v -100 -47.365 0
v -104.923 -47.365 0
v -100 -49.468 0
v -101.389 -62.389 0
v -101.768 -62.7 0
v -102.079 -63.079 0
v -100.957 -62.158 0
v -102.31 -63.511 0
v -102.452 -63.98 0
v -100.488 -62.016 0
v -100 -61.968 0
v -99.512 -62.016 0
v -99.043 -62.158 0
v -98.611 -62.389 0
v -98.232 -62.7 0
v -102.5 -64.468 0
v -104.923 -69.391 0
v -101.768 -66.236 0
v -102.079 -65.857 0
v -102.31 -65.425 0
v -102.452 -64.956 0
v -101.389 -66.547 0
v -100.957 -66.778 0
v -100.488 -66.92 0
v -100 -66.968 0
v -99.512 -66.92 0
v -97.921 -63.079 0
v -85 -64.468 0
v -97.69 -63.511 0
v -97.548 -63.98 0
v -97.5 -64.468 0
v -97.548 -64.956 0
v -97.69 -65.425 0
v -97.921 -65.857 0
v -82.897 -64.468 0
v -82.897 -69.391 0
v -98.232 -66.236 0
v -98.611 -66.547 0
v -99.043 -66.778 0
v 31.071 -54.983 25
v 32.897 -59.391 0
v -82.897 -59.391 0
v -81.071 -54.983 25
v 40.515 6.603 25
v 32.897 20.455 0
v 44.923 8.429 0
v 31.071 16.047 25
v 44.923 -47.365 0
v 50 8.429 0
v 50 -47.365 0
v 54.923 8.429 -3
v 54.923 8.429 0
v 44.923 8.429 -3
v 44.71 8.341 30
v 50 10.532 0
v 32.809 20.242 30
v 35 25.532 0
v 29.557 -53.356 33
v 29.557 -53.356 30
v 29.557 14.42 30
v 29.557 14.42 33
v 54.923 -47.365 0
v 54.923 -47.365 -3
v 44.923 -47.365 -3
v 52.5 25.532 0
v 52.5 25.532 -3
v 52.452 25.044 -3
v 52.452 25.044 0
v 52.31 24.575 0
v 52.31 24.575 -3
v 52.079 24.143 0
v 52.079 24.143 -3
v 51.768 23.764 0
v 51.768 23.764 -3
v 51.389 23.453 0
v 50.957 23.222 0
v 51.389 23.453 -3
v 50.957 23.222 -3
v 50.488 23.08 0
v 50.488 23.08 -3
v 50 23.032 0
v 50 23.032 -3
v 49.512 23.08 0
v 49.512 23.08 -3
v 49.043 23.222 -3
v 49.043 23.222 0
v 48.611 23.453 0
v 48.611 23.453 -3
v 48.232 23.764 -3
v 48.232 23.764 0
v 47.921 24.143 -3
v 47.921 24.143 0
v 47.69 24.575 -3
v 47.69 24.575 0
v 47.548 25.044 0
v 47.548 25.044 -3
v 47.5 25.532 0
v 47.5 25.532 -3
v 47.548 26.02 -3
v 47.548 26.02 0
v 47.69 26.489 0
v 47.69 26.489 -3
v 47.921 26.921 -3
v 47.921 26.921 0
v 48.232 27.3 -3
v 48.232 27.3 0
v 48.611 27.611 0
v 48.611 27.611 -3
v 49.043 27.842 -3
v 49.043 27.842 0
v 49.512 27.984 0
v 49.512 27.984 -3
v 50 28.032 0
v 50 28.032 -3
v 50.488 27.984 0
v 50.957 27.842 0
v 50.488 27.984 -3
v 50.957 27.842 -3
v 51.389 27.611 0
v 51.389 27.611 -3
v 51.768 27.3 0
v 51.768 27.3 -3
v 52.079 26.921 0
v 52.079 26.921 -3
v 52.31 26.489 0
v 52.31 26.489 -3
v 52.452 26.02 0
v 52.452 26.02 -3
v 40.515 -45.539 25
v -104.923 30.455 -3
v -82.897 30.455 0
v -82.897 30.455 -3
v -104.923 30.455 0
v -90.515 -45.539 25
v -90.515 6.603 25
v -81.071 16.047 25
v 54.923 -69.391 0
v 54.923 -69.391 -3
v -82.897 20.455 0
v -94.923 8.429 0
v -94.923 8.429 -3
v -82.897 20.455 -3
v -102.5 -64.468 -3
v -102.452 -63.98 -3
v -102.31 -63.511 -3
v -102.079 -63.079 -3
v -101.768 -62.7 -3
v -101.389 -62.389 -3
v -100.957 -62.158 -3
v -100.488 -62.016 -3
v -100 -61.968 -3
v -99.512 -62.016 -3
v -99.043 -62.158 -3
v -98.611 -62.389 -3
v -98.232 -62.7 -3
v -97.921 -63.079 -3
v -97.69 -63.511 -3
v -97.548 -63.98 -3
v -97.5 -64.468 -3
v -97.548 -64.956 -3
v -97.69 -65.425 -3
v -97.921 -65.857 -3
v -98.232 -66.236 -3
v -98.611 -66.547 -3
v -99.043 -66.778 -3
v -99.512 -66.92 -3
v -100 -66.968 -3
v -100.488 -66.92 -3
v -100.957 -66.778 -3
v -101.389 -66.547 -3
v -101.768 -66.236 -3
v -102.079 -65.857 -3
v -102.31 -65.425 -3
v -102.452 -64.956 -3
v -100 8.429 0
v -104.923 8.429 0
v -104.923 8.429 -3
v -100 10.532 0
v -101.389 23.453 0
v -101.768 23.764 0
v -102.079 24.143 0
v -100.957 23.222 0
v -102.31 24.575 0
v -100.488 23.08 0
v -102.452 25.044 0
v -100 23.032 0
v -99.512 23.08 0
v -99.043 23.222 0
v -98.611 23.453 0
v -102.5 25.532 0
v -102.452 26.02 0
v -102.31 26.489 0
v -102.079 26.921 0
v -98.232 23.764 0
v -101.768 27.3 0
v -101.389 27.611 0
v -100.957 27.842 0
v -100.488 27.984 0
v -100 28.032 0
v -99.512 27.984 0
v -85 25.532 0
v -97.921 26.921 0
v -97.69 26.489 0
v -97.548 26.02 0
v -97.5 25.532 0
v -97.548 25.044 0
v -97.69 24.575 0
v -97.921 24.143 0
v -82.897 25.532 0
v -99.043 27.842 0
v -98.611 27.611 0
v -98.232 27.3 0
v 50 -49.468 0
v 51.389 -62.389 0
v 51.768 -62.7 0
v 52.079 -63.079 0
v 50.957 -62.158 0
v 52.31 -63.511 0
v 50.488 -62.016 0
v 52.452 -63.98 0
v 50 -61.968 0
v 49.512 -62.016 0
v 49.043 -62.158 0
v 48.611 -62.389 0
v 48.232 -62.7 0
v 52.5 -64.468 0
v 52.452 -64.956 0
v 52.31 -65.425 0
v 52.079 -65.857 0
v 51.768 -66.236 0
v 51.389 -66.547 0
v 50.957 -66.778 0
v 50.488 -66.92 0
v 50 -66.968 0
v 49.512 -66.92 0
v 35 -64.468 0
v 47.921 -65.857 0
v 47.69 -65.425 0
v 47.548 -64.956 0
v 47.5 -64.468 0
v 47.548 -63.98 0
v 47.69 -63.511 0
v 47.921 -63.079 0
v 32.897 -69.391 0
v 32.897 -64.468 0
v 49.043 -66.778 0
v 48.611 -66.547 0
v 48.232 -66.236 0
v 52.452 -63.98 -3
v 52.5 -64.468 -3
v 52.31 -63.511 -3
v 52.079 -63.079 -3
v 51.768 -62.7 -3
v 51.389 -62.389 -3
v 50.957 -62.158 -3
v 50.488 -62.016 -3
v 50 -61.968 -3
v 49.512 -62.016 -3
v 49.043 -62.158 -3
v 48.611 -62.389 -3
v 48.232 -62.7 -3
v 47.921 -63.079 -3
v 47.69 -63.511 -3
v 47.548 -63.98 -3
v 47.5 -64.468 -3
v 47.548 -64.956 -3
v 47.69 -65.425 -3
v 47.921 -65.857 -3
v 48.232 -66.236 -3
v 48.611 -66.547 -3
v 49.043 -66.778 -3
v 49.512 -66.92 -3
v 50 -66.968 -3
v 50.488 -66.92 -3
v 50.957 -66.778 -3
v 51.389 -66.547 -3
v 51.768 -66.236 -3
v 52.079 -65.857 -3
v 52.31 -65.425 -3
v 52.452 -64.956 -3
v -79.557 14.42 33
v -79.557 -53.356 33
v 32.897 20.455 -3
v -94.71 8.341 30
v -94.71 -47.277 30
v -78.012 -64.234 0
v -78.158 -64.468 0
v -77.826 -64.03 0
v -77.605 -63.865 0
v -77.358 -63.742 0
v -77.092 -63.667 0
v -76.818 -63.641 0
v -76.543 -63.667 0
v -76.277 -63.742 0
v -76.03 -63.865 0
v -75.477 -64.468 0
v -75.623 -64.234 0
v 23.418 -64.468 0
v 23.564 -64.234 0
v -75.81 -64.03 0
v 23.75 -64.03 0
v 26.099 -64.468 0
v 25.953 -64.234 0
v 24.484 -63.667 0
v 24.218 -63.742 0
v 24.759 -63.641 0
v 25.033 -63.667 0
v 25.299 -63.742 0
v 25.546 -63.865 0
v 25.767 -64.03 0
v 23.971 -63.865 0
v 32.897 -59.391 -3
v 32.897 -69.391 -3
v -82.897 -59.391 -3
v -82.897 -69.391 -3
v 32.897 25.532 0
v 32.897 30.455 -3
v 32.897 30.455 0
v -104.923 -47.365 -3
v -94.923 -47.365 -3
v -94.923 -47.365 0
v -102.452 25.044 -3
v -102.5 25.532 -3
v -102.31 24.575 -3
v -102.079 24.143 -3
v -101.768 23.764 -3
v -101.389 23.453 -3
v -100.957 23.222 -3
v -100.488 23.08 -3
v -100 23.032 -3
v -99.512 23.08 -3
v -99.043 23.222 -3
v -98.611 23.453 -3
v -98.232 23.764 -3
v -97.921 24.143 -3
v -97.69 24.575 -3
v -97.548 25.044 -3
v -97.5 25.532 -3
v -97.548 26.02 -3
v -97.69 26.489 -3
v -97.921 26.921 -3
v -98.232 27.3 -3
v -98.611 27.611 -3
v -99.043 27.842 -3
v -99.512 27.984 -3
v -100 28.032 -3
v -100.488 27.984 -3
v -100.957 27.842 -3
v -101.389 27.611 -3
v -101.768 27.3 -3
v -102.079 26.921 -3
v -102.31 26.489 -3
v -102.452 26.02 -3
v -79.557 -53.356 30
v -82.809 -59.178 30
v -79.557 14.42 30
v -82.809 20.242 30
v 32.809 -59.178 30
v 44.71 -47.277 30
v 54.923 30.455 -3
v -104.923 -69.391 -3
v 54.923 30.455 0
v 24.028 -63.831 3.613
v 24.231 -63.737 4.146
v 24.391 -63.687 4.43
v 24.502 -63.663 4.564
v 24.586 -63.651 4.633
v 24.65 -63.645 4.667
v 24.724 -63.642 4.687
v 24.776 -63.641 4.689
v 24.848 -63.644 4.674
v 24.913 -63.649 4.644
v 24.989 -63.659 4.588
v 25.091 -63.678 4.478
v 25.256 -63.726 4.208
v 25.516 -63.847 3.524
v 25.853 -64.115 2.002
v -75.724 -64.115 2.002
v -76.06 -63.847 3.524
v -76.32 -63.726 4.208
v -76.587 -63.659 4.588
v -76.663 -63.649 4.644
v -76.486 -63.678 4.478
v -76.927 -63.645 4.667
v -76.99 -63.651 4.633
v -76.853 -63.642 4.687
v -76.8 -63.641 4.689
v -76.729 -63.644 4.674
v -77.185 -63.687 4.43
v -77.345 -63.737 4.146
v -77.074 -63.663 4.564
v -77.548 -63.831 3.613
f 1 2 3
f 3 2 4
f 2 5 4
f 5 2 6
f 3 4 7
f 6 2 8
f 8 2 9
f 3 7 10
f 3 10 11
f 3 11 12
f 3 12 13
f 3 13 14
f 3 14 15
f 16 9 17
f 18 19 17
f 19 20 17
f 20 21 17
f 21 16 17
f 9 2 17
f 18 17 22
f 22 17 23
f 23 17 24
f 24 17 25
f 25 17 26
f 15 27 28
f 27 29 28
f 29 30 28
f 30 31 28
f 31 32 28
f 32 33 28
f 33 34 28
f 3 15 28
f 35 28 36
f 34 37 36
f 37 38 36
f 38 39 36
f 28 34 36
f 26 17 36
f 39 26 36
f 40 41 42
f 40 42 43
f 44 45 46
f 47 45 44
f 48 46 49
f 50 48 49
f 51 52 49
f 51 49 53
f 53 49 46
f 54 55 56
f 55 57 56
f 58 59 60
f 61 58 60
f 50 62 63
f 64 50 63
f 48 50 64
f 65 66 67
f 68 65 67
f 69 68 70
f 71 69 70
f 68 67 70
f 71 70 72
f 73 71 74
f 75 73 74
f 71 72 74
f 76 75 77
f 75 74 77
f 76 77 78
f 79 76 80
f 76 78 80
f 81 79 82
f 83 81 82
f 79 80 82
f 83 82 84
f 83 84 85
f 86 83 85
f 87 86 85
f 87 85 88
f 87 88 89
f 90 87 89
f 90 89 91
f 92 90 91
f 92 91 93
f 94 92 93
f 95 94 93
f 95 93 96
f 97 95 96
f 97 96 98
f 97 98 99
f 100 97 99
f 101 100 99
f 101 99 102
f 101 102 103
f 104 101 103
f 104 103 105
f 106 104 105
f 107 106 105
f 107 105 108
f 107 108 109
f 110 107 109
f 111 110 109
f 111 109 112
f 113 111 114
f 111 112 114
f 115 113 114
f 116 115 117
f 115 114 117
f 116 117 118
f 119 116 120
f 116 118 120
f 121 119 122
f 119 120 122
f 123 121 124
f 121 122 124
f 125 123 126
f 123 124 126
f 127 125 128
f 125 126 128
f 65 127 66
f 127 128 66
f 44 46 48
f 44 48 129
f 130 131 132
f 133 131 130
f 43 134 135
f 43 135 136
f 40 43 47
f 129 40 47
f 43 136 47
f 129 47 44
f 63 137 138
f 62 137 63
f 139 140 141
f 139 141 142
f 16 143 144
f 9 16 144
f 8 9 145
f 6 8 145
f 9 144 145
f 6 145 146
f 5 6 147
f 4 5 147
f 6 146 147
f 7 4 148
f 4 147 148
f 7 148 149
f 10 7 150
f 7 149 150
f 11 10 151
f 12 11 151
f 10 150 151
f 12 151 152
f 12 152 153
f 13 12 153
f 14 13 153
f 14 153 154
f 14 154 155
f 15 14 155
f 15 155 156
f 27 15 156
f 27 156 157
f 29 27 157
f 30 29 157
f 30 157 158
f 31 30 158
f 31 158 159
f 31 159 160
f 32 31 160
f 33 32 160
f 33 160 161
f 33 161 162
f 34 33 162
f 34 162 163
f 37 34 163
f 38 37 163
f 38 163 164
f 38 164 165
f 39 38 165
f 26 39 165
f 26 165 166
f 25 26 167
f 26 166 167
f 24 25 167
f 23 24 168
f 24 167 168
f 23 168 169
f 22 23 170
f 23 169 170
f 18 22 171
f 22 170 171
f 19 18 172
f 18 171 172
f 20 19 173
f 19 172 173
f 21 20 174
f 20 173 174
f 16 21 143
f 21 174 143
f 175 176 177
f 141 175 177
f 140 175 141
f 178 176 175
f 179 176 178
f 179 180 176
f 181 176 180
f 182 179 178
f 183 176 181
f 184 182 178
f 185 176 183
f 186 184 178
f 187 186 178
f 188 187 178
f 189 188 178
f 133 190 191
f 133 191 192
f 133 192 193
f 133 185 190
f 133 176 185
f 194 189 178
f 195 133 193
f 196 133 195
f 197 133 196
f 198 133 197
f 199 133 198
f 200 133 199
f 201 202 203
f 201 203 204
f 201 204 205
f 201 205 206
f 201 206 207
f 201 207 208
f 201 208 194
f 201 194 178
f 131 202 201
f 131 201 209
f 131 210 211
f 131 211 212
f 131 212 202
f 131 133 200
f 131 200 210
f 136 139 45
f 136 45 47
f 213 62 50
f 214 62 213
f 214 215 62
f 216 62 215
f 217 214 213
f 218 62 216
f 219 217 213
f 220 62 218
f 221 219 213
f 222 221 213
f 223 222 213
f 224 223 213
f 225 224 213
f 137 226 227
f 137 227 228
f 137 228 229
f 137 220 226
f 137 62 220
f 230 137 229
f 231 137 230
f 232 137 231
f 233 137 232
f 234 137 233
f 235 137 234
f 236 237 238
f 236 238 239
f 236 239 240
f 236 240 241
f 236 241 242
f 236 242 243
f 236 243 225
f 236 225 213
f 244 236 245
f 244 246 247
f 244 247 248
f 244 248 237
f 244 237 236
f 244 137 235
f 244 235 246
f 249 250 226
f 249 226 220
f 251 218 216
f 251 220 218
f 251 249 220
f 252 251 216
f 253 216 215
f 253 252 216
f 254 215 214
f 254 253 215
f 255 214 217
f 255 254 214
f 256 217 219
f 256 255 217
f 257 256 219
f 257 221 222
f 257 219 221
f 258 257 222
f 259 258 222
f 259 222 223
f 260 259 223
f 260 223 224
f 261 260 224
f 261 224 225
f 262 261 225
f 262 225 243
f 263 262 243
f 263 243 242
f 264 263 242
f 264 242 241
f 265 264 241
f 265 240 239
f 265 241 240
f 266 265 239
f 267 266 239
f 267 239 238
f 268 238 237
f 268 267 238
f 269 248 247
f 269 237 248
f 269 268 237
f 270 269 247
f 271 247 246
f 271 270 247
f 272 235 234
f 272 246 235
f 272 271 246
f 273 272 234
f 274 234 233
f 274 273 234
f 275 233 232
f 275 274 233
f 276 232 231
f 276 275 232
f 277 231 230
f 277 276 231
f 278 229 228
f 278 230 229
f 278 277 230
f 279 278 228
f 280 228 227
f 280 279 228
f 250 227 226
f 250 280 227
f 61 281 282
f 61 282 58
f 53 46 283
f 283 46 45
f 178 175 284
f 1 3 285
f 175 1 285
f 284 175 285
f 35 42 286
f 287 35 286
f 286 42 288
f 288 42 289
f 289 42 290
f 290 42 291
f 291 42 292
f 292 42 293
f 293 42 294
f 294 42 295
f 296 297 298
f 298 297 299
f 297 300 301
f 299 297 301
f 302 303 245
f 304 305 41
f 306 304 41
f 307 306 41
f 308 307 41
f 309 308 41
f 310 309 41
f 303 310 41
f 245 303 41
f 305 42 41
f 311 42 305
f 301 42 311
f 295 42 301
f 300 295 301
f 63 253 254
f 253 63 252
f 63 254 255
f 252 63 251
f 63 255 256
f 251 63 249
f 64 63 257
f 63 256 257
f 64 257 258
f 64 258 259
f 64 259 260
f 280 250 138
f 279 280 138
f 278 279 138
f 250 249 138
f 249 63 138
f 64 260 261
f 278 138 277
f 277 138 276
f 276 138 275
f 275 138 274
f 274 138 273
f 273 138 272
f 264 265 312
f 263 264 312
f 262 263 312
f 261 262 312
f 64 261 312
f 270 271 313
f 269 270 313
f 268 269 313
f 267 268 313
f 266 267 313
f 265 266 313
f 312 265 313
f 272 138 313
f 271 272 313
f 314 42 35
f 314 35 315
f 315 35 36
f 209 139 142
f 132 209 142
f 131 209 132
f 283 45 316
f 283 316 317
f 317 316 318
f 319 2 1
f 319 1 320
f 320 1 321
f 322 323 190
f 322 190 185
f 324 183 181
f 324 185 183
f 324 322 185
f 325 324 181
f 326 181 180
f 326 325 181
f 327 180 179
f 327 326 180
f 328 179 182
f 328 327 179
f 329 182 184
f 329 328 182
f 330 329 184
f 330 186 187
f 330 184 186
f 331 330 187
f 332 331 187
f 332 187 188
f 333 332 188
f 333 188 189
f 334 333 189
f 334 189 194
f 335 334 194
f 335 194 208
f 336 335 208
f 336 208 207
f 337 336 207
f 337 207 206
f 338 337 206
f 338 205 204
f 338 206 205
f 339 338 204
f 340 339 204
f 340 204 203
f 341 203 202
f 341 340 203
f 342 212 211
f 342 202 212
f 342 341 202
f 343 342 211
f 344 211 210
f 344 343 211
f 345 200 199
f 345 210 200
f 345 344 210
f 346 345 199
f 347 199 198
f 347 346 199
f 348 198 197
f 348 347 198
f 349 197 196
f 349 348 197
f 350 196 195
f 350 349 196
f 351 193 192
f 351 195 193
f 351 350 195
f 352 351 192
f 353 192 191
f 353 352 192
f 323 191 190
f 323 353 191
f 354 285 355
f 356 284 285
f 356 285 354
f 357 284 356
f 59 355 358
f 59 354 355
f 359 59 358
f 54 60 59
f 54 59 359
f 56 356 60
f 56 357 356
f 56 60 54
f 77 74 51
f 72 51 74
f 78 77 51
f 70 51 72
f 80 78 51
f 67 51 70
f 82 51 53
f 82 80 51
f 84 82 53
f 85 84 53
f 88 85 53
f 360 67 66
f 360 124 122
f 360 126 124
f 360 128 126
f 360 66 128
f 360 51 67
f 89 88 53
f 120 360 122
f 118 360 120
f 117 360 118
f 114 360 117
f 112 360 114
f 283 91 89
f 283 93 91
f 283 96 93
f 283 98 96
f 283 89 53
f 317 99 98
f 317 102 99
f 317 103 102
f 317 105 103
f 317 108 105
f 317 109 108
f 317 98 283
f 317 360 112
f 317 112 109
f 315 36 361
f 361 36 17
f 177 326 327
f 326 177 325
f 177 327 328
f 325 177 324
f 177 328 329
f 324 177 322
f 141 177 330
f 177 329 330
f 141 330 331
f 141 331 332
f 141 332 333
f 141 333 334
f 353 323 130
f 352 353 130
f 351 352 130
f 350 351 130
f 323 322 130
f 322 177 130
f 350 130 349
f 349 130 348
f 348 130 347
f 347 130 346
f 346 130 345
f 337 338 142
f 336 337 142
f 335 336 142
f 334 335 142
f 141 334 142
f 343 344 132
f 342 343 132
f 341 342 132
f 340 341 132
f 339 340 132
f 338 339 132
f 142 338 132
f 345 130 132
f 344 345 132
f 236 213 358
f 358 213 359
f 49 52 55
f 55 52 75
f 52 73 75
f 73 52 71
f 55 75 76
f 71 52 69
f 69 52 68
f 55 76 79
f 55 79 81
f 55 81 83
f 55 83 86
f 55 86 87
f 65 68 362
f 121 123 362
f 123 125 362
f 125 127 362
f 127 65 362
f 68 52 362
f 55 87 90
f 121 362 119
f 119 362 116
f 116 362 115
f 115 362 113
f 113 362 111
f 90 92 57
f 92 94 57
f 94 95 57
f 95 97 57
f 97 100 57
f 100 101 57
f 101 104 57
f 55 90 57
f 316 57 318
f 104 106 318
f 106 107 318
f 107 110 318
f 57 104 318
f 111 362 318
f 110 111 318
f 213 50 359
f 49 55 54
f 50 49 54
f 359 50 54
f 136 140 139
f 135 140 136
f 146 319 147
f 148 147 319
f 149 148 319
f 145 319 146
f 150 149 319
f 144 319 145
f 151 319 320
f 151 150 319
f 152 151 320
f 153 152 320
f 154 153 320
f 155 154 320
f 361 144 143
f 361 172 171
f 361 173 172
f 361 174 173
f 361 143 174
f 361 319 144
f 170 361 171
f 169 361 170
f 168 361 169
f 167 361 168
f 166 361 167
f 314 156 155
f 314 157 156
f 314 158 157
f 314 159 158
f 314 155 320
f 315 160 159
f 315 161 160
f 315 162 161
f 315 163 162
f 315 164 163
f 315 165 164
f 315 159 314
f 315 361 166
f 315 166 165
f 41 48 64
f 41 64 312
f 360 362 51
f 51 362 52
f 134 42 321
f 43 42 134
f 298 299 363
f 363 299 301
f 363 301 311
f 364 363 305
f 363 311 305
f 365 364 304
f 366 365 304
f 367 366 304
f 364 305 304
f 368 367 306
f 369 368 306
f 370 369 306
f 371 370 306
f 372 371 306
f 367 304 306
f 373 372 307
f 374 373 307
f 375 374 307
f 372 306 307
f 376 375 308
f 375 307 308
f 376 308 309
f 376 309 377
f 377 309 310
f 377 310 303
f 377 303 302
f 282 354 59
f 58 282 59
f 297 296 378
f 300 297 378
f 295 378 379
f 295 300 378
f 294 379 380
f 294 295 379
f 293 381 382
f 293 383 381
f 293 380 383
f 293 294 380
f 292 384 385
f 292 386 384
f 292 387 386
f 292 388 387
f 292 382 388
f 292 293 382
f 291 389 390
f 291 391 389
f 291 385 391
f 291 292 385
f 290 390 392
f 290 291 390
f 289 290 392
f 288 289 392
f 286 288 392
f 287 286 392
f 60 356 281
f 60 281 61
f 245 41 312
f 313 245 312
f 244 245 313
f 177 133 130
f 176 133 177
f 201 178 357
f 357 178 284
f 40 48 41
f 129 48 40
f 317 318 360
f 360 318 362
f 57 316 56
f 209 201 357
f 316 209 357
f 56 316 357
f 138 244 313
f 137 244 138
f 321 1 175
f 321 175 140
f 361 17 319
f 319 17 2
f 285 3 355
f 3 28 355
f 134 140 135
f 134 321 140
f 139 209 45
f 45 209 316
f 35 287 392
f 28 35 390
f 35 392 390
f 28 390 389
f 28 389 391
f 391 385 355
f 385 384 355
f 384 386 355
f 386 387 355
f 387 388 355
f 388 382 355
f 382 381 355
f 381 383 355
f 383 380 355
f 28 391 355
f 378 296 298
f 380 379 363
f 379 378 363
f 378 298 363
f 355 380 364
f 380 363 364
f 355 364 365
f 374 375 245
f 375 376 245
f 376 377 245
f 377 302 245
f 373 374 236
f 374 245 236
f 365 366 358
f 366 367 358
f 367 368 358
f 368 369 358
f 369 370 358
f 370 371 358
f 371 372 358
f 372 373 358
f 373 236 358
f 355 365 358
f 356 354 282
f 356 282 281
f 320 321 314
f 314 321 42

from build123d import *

# Parameters (mm, degrees)
BOSS_EXTRUDE1_DEPTH     = 30
BOSS_EXTRUDE1_TAPER     = 10
SHELL1_T                = -5
SKETCH4_R               = 1.5
CUT_EXTRUDE1_DEPTH      = 15
SKETCH5_W               = 109.114976024
SKETCH5_H               = 67.775815427
BOSS_EXTRUDE3_DEPTH     = 3
BOSS_EXTRUDE5_DEPTH     = 3
MIRROR5_COPY_1_DEPTH    = 3
CUT_EXTRUDE2_START      = -4
SKETCH9_R               = 2.5
CUT_EXTRUDE2_DEPTH      = 38
MIRROR7_START           = -4
MIRROR7_COPY_1_SKETCH_R = 2.5
MIRROR7_COPY_1_DEPTH    = 38


with BuildPart() as part:
    # Sketch1 → Boss-Extrude1 (new body)
    with BuildSketch(Plane.XY):
        Polygon((-100, 10.531931481), (-100, -49.468068519), (-85, -64.468068519), (35, -64.468068519), (50, -49.468068519), (50, 10.531931481), (35, 25.531931481), (-85, 25.531931481), align=None)
    extrude(amount=BOSS_EXTRUDE1_DEPTH, taper=BOSS_EXTRUDE1_TAPER)

    # Shell1
    shell1_openings = [part.faces().sort_by_distance(p)[0] for p in [
        (-25, -19.468068519, 0),
    ]]
    offset(amount=SHELL1_T, openings=shell1_openings, kind=Kind.INTERSECTION)

    # Sketch4 → Cut-Extrude1 (cut)
    with BuildSketch(Plane(origin=(0, 0, -7), x_dir=(-1, 0, 0), z_dir=(0, 0, -1))):
        with Locations((-24.758515909, -65.141240386)):
            Circle(SKETCH4_R)
    cut_extrude1 = extrude(amount=-CUT_EXTRUDE1_DEPTH, mode=Mode.SUBTRACT)

    # Mirror1: Cut-Extrude1 across plane
    add(cut_extrude1.mirror(Plane(origin=(-26.029584976, 0, 0), x_dir=(0, 0, 1), z_dir=(1, 0, 0))), mode=Mode.SUBTRACT)

    # Sketch5 → Boss-Extrude3 (add)
    with BuildSketch(Plane.XY.offset(30)):
        with Locations((-25, -19.468068519)):
            Rectangle(SKETCH5_W, SKETCH5_H)
    extrude(amount=BOSS_EXTRUDE3_DEPTH)

    # Sketch8 → Boss-Extrude5 (add)
    with BuildSketch(Plane(origin=(0, 0, 0), x_dir=(-1, 0, 0), z_dir=(0, 0, -1))):
        Polygon((-54.922866941, 8.42891411), (-44.922866941, 8.42891411), (-32.896982629, 20.454798422), (-32.896982629, 30.454798422), (-54.922866941, 30.454798422), align=None)
    boss_extrude5 = extrude(amount=BOSS_EXTRUDE5_DEPTH)

    # Mirror4: Boss-Extrude5 across plane
    add(boss_extrude5.mirror(Plane.ZY.offset(25)))

    # Mirror5: Boss-Extrude5 across plane
    add(boss_extrude5.mirror(Plane.ZX.offset(-19.468068519)))

    # Mirror5 copy 1 sketch → Mirror5 copy 1 (add)
    with BuildSketch(Plane(origin=(-50, -38.936137038, 0), x_dir=(1, 0, 0), z_dir=(0, 0, -1))):
        Polygon((-54.922866941, 8.42891411), (-44.922866941, 8.42891411), (-32.896982629, 20.454798422), (-32.896982629, 30.454798422), (-54.922866941, 30.454798422), align=None)
    extrude(amount=MIRROR5_COPY_1_DEPTH)

    # Sketch9 → Cut-Extrude2 (cut)
    with BuildSketch(Plane.XY.offset(CUT_EXTRUDE2_START)):
        with Locations((50, -64.468068519)):
            Circle(SKETCH9_R)
    cut_extrude2 = extrude(amount=CUT_EXTRUDE2_DEPTH, mode=Mode.SUBTRACT)

    # Mirror6: Cut-Extrude2 across plane
    add(cut_extrude2.mirror(Plane.ZY.offset(25)), mode=Mode.SUBTRACT)

    # Mirror7: Cut-Extrude2 across plane
    add(cut_extrude2.mirror(Plane.ZX.offset(-19.468068519)), mode=Mode.SUBTRACT)

    # Mirror7 copy 1 sketch → Mirror7 copy 1 (cut)
    with BuildSketch(Plane(origin=(-50, -38.936137038, 0), x_dir=(-1, 0, 0), z_dir=(0, 0, 1)).offset(MIRROR7_START)):
        with Locations((50, -64.468068519)):
            Circle(MIRROR7_COPY_1_SKETCH_R)
    extrude(amount=MIRROR7_COPY_1_DEPTH, mode=Mode.SUBTRACT)


solid = part.part
